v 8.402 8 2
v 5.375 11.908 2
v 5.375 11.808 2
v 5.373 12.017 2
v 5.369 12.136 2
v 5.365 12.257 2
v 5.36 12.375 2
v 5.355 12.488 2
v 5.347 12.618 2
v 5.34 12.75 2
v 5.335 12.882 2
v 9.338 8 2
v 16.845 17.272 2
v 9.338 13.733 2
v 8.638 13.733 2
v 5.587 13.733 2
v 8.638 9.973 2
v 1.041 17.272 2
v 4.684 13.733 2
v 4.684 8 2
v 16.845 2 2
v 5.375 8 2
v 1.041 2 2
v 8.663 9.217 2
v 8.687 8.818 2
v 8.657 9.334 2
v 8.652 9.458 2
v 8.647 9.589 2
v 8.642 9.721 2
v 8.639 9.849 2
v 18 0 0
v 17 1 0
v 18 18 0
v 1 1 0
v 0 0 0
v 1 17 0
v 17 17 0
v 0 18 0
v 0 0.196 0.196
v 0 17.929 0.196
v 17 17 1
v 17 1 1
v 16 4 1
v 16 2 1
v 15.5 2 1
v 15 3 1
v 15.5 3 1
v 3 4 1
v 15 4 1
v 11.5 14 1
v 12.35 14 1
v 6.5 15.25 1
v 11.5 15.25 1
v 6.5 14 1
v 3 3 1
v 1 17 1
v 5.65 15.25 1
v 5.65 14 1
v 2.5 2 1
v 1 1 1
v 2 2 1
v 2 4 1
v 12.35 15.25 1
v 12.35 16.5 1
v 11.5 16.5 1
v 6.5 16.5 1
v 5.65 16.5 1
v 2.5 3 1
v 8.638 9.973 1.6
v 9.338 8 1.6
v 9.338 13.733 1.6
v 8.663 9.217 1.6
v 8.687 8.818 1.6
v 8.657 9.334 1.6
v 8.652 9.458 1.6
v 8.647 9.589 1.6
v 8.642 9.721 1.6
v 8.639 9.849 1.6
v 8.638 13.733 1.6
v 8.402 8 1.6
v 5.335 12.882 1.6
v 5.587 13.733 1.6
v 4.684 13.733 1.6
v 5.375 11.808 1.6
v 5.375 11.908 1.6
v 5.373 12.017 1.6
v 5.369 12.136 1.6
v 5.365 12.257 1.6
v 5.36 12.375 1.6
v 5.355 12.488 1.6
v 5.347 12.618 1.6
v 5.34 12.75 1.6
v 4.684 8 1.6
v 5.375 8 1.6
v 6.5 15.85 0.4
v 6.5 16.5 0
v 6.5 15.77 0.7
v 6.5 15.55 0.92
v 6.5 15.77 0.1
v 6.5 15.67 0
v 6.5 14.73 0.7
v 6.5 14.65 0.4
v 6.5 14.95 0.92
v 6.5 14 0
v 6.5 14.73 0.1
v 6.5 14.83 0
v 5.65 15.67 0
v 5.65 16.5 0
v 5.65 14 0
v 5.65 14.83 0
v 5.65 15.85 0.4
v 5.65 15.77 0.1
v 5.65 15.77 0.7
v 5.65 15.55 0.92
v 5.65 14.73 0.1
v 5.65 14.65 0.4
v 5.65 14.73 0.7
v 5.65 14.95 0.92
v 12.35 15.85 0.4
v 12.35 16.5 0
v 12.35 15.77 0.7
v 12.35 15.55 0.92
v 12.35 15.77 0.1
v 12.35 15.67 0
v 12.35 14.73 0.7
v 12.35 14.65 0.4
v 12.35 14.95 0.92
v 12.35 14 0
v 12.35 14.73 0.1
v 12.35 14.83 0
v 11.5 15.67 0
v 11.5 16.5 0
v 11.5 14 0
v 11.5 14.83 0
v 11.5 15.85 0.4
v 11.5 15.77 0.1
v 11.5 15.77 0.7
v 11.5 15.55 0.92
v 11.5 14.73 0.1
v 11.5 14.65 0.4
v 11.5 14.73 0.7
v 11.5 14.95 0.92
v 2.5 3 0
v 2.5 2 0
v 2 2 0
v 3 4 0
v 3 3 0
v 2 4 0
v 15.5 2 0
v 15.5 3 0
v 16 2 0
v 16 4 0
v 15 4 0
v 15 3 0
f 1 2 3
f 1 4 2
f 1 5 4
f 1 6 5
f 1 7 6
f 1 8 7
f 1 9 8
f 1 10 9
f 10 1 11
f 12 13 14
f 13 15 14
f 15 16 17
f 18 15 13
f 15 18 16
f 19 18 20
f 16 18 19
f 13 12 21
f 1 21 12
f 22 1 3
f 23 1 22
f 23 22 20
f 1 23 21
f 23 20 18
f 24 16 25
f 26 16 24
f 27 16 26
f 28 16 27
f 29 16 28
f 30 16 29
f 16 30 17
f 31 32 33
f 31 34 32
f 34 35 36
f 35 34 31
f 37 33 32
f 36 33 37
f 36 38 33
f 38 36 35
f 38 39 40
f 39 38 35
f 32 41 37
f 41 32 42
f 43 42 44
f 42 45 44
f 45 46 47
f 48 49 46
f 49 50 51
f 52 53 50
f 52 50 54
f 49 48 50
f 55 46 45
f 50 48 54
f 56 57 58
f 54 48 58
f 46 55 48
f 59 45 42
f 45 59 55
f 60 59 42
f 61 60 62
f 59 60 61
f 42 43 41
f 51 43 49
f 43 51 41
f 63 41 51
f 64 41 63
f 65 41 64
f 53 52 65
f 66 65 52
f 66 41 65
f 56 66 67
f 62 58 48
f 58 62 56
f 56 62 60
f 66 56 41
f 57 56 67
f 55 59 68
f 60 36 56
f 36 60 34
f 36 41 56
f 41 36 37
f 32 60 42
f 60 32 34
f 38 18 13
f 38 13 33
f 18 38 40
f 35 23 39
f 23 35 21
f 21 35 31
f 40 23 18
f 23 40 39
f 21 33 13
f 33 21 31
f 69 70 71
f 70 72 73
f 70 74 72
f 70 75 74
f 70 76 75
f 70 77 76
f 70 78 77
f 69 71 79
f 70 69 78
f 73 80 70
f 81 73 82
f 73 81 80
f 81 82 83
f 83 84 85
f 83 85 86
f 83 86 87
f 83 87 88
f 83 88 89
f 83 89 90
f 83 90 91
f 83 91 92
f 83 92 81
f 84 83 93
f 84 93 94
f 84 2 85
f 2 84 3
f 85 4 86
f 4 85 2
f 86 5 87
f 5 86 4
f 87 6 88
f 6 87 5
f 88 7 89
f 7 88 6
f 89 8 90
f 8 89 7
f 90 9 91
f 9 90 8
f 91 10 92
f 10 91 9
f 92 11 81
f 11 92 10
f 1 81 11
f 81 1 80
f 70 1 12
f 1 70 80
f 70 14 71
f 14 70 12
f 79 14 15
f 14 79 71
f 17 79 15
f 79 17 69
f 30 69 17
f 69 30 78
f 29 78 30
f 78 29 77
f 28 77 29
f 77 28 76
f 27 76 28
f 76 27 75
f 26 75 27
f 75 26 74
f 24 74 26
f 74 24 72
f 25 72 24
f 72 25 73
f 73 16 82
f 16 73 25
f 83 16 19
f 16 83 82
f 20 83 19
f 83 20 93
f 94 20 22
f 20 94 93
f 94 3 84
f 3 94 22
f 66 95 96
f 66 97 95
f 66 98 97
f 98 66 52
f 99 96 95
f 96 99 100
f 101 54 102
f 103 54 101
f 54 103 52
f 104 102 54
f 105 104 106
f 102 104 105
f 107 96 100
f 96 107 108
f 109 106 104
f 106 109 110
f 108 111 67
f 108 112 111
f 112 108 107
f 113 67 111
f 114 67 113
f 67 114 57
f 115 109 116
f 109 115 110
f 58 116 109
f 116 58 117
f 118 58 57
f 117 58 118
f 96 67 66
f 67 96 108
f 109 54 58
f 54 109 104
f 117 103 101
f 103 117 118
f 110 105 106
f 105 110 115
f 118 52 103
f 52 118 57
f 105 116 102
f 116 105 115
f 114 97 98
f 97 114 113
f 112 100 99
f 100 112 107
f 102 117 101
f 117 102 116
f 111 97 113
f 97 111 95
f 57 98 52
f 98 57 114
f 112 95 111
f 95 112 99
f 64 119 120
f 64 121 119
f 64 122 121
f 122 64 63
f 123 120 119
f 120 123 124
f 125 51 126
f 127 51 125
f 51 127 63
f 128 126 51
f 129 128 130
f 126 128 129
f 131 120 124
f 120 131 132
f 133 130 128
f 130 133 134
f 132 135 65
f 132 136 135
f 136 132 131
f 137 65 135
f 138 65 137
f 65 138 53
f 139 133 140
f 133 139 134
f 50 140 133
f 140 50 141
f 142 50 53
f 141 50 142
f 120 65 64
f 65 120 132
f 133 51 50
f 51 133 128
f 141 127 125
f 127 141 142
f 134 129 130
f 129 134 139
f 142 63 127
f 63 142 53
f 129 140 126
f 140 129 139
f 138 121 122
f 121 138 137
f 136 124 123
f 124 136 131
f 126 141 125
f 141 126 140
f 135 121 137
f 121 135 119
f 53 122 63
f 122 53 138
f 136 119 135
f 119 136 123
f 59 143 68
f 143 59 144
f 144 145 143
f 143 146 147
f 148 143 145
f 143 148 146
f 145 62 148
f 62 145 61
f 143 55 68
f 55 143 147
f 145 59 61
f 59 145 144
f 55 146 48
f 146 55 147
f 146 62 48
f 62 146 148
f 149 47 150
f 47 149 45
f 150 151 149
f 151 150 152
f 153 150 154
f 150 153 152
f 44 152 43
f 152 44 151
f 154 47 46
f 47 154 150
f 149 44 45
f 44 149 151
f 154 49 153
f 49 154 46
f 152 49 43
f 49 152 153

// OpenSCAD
module keybase() {
	difference() {
    cube(size = [18, 18 ,2]);
		translate([1,1,0]) 
			cube(size = [16,16,1]);
		translate([-1,18,0])
			rotate([20,0,0])
				cube(size=[19,3,3]);
		translate([-1,0,0])
			rotate([45,0,0])
				cube(size=[19,3,3]);
		translate([-3,0,1])
			rotate([0,30,0])
				cube(size=[3,19,3]);
		translate([18,0,0])
			rotate([0,-30,0])
				cube(size=[3,19,3]);
	}
}
module character(c) {
    echo("key for char ", c);
    translate([4,8,1.6]) {
        linear_extrude(height = 0.5) {
            text(c,size=6);
        }
    }
}

module hook(){
	color("blue")
		difference(){
			cube(size=[.85,2.5,1]);
			translate([0,1.25,0.4])
				rotate([0,90,0],$fn=12)
					cylinder(h=1,r1=.6,r2=.6);
		}
}
module thing(){
	color("blue")
		union(){
			cube(size=[.5,1,1]);
			translate([0,1,0]) cube(size=[1,1,1]);
		}
}

module hooks(){
	translate([6.5-.85,14,0]) hook();
	translate([18-6.5,14,0]) hook();
	translate([2,2,0])thing();
	translate([16,2,0]) mirror() thing();
}

module keycap(c){
   difference() {
       keybase();
       character(c);
   }
	 hooks();
}
keycap("N");
